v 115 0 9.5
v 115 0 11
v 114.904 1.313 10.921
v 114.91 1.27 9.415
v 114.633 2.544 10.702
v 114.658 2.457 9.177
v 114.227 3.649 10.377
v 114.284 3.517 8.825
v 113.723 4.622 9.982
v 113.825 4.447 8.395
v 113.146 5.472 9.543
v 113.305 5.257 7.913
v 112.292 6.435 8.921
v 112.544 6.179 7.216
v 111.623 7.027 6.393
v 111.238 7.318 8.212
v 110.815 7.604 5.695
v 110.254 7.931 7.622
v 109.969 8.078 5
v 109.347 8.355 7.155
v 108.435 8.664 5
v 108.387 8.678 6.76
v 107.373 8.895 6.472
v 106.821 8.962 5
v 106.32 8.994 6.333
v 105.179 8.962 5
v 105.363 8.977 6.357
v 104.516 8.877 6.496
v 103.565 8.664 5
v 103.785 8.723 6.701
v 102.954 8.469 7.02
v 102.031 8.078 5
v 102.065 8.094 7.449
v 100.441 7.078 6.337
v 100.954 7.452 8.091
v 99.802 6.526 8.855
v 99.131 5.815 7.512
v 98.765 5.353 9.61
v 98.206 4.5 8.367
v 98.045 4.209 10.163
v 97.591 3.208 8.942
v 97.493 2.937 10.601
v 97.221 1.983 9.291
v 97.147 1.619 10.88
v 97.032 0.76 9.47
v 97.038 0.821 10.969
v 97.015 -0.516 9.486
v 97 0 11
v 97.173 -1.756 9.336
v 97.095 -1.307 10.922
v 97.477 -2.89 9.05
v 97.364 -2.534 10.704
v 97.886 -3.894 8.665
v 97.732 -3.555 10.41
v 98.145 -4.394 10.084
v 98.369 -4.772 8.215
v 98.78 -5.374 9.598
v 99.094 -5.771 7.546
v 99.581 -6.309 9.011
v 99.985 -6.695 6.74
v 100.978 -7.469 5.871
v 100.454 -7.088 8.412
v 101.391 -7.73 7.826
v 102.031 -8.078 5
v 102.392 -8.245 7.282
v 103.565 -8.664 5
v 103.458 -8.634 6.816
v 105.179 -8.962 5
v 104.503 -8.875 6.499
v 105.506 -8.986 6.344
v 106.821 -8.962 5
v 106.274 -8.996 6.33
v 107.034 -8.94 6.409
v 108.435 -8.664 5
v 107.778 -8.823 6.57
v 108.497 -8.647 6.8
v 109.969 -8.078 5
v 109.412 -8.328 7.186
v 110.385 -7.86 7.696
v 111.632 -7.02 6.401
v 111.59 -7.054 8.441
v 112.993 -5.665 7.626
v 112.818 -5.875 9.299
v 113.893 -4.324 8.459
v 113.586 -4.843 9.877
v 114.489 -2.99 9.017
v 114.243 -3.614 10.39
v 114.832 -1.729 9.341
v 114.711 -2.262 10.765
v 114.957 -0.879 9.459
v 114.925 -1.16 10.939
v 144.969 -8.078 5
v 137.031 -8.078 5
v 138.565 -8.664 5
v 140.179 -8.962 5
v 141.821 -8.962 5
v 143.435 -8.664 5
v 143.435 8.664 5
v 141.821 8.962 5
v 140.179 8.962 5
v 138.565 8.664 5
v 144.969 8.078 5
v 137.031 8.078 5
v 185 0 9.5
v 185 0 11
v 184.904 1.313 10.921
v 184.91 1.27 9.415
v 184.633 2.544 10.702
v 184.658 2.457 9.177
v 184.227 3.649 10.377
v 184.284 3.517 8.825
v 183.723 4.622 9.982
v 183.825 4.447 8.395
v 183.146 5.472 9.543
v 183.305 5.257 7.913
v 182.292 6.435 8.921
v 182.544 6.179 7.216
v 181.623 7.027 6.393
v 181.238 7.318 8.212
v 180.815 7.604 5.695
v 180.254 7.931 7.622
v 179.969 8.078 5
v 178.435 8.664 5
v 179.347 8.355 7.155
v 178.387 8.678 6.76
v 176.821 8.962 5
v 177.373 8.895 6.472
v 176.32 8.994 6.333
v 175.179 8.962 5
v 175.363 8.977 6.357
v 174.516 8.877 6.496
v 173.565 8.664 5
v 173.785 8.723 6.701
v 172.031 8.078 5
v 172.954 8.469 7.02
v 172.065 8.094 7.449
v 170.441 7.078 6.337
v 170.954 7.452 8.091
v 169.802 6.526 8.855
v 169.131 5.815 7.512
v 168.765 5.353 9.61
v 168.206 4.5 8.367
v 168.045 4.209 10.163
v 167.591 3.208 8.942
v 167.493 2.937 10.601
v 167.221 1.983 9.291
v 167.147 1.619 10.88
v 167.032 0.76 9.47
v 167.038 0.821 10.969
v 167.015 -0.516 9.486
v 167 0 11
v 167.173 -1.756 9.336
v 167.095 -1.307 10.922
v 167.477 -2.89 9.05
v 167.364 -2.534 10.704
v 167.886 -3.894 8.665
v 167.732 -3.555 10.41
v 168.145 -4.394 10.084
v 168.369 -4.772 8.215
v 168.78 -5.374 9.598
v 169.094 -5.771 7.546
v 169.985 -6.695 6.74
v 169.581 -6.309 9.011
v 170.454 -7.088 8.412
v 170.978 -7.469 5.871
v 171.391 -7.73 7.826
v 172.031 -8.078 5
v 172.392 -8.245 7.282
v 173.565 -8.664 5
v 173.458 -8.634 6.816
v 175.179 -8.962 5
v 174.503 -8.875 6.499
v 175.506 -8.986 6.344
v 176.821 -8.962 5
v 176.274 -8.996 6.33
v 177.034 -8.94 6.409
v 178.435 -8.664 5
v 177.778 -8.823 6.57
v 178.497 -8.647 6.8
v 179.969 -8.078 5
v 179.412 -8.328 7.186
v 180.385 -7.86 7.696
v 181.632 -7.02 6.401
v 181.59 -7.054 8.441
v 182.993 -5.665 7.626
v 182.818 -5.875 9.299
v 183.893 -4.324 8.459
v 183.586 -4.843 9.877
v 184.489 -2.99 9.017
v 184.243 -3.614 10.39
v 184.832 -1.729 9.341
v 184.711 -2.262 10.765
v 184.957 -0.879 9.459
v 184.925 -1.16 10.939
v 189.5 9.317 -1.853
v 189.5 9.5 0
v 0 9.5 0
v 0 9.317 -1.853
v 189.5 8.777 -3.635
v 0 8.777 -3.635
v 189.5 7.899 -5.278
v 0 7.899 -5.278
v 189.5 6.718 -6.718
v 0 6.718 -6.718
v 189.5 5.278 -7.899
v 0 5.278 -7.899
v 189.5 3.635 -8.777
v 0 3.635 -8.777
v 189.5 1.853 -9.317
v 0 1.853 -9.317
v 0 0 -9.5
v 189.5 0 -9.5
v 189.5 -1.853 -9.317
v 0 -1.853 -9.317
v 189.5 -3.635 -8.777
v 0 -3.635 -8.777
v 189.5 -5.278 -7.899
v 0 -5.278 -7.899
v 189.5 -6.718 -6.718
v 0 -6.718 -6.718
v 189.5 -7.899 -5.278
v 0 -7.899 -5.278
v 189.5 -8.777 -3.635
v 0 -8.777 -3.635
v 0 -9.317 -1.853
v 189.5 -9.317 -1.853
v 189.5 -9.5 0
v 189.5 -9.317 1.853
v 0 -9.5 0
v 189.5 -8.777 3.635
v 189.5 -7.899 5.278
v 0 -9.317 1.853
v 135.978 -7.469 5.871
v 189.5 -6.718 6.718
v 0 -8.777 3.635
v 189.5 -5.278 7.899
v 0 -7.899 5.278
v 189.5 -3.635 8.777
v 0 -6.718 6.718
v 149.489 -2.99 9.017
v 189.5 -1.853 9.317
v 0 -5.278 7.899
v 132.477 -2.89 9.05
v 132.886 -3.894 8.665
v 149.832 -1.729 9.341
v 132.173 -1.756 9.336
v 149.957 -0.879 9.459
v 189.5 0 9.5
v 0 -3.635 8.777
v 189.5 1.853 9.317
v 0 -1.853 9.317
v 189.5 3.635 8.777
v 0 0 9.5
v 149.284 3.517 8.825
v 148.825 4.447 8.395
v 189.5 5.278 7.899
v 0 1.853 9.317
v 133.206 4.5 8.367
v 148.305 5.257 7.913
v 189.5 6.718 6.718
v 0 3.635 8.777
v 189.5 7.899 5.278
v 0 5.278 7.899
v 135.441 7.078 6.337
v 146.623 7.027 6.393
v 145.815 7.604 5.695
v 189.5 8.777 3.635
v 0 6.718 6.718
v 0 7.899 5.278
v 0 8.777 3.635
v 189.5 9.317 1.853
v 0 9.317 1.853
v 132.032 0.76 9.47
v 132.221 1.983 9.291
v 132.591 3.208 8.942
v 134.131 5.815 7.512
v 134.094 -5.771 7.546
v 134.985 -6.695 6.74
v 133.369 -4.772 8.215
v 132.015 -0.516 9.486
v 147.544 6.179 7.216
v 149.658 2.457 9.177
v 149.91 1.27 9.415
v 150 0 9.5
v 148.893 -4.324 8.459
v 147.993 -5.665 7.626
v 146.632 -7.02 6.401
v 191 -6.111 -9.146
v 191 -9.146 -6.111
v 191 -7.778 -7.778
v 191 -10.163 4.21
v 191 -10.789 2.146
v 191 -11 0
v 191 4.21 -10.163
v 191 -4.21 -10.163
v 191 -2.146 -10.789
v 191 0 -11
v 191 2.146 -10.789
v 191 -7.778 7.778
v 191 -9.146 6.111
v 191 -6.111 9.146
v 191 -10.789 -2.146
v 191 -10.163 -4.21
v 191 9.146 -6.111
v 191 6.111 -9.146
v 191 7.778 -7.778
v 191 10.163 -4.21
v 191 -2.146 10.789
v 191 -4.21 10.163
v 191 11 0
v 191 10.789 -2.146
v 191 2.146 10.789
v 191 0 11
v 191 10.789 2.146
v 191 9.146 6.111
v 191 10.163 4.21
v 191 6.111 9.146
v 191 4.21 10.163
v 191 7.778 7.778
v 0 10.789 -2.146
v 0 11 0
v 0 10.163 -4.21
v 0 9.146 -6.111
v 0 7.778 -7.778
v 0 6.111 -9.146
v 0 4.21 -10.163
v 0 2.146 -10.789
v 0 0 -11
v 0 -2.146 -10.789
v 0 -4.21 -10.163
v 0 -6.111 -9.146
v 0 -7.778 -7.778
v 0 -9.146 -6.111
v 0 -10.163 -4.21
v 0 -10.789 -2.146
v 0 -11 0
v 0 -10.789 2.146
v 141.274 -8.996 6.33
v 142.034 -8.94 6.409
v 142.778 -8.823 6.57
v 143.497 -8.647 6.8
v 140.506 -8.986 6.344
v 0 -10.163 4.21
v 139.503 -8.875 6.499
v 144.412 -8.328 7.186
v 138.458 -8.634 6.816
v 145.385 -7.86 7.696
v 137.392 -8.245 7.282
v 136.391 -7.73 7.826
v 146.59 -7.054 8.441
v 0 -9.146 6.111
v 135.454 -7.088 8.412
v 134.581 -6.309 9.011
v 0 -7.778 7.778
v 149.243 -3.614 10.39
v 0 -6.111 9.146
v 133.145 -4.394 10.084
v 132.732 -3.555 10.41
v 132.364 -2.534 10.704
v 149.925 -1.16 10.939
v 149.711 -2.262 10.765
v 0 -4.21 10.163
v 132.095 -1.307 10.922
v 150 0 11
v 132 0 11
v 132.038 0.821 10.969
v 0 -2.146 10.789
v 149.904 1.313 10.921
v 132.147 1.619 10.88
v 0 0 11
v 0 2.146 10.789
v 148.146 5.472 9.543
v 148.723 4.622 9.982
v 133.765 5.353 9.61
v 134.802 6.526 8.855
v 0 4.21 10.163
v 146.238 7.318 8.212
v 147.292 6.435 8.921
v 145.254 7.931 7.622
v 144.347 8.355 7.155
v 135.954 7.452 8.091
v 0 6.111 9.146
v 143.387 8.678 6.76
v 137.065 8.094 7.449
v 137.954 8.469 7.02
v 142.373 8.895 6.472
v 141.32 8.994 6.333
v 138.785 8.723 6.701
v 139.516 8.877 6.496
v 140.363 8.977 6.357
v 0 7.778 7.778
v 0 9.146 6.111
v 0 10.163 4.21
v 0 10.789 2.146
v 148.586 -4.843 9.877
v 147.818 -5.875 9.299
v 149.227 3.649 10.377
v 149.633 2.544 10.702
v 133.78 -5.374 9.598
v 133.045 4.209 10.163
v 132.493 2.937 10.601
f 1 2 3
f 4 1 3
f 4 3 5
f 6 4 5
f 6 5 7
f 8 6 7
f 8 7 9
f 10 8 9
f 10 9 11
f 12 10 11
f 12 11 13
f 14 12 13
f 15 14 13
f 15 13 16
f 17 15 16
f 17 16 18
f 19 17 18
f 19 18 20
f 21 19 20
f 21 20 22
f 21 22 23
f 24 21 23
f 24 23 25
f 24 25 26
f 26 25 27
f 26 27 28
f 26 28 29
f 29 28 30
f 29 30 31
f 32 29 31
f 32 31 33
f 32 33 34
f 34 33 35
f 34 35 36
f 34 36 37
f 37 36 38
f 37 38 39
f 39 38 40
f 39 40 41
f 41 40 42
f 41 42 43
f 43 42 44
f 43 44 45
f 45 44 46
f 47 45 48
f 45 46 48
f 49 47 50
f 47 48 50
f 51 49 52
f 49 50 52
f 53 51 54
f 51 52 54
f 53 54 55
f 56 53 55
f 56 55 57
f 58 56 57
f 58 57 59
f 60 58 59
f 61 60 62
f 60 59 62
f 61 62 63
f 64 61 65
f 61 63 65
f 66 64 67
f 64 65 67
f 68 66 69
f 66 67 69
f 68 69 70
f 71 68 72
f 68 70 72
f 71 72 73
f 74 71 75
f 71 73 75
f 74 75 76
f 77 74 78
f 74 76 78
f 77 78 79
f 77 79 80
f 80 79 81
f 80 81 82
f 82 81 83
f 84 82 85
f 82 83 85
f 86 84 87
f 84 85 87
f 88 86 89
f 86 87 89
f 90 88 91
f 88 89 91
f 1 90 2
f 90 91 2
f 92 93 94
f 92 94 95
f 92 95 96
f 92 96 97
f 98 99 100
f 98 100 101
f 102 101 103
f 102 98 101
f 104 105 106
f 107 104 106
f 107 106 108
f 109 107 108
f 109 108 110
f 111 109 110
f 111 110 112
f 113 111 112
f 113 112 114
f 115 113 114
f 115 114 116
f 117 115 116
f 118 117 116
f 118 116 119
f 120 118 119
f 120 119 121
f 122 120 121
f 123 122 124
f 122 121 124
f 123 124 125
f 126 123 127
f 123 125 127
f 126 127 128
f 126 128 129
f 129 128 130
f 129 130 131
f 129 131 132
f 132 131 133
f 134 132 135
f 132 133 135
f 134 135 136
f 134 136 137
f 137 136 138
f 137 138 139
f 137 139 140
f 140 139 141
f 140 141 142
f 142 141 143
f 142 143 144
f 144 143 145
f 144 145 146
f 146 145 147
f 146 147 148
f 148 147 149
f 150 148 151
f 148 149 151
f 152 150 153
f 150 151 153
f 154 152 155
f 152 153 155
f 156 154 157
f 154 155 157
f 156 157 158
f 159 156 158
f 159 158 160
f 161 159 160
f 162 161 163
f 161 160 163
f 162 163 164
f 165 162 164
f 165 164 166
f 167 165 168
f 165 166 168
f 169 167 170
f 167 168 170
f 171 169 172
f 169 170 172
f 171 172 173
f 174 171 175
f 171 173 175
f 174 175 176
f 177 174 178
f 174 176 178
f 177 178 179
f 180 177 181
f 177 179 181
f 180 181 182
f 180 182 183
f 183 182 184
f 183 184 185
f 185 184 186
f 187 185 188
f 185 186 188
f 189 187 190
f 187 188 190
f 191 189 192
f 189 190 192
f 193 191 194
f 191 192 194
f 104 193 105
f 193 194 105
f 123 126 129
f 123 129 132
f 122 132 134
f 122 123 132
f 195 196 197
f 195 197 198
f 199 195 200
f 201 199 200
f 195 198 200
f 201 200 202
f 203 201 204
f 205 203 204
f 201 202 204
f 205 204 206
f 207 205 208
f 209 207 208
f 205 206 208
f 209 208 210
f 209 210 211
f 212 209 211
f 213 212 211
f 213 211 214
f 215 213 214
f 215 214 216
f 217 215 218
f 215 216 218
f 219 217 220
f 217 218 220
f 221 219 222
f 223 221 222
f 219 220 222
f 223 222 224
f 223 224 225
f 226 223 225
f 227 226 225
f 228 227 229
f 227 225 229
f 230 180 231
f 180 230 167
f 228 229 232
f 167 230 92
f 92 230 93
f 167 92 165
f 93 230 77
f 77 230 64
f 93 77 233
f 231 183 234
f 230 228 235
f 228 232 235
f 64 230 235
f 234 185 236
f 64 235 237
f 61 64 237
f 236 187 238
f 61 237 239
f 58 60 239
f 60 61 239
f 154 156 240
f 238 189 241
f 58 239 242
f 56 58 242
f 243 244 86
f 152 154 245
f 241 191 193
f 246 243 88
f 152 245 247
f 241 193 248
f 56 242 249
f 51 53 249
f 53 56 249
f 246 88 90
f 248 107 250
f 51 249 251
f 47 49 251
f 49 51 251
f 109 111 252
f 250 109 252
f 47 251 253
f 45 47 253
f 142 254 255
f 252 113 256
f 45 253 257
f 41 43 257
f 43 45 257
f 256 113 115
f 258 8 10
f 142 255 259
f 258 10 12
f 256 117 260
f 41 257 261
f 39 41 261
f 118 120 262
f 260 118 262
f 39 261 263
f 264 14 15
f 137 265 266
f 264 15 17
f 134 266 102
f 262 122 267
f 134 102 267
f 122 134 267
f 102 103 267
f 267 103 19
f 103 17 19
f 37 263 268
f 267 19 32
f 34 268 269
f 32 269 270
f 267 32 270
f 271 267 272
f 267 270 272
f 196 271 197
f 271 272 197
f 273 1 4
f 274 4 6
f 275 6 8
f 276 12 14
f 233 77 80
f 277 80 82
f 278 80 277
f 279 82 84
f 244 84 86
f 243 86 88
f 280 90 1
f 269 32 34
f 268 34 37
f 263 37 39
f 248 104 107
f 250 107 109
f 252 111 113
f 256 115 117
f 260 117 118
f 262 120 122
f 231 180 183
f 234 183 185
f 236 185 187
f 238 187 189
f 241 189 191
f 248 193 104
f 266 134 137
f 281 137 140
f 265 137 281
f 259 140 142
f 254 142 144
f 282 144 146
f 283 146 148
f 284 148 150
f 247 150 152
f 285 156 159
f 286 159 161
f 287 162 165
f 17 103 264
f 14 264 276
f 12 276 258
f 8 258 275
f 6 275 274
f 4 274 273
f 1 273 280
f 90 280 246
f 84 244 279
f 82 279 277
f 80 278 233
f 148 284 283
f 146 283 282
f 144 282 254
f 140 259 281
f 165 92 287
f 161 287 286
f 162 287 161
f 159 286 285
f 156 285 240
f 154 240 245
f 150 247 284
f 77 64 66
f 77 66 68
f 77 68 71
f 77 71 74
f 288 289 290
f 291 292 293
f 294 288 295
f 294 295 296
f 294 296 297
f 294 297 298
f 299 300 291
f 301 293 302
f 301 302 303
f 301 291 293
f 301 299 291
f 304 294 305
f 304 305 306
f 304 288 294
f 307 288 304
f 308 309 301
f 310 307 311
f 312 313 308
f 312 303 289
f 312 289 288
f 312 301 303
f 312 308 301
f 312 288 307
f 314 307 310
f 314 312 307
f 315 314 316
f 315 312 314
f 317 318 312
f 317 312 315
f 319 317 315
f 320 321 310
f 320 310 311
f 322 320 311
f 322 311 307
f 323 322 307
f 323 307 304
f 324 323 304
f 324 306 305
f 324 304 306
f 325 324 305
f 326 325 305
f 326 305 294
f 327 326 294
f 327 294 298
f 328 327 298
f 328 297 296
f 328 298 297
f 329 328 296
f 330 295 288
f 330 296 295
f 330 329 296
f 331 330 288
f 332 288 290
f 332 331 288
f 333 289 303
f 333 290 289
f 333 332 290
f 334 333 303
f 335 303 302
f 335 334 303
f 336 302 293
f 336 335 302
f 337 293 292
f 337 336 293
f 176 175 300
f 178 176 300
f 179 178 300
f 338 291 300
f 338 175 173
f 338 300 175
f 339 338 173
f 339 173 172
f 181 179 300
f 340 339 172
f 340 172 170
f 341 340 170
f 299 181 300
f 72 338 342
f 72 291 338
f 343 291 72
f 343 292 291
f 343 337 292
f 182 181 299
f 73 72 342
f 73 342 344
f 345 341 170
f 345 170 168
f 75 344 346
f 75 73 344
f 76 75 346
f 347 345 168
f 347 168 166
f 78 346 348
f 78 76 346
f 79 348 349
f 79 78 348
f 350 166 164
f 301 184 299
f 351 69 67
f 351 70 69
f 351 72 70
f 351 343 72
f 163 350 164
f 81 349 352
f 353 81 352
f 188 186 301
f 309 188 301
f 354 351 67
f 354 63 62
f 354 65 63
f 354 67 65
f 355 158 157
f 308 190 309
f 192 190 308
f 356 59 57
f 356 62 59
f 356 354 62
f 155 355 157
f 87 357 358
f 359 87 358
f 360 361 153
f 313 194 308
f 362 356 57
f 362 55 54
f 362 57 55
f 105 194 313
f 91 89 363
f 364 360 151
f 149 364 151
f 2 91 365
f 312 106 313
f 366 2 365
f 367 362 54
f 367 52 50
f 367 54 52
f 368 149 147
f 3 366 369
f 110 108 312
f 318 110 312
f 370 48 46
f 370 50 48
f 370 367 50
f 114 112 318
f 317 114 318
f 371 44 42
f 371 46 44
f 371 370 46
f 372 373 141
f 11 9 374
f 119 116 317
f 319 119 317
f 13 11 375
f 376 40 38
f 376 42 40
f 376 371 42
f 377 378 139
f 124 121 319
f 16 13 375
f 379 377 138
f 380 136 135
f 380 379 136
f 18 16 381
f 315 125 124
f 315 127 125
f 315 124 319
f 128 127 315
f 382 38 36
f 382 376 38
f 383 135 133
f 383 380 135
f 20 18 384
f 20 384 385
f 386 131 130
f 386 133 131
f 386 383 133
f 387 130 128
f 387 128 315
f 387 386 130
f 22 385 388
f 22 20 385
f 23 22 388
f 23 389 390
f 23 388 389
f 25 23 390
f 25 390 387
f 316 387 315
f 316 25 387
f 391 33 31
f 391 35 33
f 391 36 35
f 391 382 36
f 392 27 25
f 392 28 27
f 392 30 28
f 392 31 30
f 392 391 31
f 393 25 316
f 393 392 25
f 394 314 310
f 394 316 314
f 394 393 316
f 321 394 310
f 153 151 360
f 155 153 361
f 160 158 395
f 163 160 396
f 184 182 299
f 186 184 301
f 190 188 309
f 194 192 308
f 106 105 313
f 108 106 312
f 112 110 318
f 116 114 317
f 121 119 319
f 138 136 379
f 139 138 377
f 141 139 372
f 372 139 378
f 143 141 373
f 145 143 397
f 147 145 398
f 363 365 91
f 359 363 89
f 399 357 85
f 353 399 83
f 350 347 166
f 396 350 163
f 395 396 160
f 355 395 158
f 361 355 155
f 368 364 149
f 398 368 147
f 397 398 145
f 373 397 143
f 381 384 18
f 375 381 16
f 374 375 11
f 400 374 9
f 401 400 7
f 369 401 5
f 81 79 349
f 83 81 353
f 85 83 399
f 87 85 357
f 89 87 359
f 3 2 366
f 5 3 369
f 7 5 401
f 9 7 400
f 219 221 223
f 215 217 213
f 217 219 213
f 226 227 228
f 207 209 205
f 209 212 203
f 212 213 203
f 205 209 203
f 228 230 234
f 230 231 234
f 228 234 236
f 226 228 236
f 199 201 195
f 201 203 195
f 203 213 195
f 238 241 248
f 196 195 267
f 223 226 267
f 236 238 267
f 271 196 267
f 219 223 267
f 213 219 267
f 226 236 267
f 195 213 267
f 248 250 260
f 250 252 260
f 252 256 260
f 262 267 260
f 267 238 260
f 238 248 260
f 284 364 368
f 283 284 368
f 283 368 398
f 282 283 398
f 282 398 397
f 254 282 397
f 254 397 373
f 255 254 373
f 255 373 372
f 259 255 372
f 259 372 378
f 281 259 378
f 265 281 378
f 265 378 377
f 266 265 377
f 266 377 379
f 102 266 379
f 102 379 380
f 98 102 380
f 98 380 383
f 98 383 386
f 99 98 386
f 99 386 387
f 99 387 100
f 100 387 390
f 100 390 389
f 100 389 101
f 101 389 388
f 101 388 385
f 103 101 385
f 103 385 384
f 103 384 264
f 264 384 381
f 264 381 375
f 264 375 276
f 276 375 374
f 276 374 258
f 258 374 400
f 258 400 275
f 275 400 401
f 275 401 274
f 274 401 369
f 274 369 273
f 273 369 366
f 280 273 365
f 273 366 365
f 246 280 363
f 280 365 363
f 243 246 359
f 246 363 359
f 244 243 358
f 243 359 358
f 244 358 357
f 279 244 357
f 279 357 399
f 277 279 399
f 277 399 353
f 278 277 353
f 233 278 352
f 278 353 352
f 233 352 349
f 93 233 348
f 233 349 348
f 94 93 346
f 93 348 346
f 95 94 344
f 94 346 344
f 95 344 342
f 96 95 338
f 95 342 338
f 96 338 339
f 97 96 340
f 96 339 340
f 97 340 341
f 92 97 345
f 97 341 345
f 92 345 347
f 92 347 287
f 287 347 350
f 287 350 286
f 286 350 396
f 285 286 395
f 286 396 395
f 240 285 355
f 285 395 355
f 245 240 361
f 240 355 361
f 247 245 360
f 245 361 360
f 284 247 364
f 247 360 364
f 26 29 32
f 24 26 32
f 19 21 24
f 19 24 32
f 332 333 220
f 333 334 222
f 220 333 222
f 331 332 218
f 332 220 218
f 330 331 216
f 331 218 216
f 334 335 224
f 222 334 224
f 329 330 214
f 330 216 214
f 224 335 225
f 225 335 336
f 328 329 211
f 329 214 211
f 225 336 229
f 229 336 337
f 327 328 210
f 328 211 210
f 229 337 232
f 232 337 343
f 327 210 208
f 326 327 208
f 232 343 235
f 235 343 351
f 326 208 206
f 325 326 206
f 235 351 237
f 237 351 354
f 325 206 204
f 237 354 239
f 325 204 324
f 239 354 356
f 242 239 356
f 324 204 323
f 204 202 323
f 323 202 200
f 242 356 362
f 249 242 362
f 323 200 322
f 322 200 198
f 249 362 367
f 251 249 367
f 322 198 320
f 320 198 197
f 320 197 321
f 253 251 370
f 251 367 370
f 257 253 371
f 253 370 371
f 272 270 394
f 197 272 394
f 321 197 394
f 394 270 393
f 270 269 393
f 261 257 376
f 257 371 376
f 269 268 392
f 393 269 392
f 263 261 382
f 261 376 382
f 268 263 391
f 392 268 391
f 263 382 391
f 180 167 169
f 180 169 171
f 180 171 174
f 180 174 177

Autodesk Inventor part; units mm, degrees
ref_plane "YZ Plane" through (0, 0, 0) normal (1, 0, 0) x (0, 1, 0)
ref_plane "XZ Plane" through (0, 0, 0) normal (0, 1, 0) x (-1, 0, 0)
sketch "Skizze1" plane through (0, 0, 0) normal (1, 0, 0) x (0, 1, 0)
  circle A0 centre (0, 0) radius 11
  dimension "d0" = 22
extrude "Extrusion1" add sketch "Skizze1" along normal blind 191
shell "Wandung1" thickness 1.5 removed faces 1 at (0, -3.2467, -1.704)
ref_plane "Arbeitsebene1" through (0, 0, 11) normal (0, 0, 1) x (1, 0, 0)
sketch "Skizze2" plane through (0, 0, 11) normal (0, 0, 1) x (1, 0, 0)
  circle A0 centre (106, 0) radius 9
  circle A1 centre (141, 0) radius 9
  circle A2 centre (176, 0) radius 9
  line L0 (191, -11) -> (191, 11) projected
  line L1 (0, -11) -> (0, 11) projected
  point P0 (0, 0)
  dimension "d6" = 15
  dimension "d7" = 35
  dimension "d8" = 35
  dimension "d9" = 18
extrude "Extrusion2" cut sketch "Skizze2" against normal blind 6
properties part number "102 part 2" material "Aluminum 6061, geschweißt"
